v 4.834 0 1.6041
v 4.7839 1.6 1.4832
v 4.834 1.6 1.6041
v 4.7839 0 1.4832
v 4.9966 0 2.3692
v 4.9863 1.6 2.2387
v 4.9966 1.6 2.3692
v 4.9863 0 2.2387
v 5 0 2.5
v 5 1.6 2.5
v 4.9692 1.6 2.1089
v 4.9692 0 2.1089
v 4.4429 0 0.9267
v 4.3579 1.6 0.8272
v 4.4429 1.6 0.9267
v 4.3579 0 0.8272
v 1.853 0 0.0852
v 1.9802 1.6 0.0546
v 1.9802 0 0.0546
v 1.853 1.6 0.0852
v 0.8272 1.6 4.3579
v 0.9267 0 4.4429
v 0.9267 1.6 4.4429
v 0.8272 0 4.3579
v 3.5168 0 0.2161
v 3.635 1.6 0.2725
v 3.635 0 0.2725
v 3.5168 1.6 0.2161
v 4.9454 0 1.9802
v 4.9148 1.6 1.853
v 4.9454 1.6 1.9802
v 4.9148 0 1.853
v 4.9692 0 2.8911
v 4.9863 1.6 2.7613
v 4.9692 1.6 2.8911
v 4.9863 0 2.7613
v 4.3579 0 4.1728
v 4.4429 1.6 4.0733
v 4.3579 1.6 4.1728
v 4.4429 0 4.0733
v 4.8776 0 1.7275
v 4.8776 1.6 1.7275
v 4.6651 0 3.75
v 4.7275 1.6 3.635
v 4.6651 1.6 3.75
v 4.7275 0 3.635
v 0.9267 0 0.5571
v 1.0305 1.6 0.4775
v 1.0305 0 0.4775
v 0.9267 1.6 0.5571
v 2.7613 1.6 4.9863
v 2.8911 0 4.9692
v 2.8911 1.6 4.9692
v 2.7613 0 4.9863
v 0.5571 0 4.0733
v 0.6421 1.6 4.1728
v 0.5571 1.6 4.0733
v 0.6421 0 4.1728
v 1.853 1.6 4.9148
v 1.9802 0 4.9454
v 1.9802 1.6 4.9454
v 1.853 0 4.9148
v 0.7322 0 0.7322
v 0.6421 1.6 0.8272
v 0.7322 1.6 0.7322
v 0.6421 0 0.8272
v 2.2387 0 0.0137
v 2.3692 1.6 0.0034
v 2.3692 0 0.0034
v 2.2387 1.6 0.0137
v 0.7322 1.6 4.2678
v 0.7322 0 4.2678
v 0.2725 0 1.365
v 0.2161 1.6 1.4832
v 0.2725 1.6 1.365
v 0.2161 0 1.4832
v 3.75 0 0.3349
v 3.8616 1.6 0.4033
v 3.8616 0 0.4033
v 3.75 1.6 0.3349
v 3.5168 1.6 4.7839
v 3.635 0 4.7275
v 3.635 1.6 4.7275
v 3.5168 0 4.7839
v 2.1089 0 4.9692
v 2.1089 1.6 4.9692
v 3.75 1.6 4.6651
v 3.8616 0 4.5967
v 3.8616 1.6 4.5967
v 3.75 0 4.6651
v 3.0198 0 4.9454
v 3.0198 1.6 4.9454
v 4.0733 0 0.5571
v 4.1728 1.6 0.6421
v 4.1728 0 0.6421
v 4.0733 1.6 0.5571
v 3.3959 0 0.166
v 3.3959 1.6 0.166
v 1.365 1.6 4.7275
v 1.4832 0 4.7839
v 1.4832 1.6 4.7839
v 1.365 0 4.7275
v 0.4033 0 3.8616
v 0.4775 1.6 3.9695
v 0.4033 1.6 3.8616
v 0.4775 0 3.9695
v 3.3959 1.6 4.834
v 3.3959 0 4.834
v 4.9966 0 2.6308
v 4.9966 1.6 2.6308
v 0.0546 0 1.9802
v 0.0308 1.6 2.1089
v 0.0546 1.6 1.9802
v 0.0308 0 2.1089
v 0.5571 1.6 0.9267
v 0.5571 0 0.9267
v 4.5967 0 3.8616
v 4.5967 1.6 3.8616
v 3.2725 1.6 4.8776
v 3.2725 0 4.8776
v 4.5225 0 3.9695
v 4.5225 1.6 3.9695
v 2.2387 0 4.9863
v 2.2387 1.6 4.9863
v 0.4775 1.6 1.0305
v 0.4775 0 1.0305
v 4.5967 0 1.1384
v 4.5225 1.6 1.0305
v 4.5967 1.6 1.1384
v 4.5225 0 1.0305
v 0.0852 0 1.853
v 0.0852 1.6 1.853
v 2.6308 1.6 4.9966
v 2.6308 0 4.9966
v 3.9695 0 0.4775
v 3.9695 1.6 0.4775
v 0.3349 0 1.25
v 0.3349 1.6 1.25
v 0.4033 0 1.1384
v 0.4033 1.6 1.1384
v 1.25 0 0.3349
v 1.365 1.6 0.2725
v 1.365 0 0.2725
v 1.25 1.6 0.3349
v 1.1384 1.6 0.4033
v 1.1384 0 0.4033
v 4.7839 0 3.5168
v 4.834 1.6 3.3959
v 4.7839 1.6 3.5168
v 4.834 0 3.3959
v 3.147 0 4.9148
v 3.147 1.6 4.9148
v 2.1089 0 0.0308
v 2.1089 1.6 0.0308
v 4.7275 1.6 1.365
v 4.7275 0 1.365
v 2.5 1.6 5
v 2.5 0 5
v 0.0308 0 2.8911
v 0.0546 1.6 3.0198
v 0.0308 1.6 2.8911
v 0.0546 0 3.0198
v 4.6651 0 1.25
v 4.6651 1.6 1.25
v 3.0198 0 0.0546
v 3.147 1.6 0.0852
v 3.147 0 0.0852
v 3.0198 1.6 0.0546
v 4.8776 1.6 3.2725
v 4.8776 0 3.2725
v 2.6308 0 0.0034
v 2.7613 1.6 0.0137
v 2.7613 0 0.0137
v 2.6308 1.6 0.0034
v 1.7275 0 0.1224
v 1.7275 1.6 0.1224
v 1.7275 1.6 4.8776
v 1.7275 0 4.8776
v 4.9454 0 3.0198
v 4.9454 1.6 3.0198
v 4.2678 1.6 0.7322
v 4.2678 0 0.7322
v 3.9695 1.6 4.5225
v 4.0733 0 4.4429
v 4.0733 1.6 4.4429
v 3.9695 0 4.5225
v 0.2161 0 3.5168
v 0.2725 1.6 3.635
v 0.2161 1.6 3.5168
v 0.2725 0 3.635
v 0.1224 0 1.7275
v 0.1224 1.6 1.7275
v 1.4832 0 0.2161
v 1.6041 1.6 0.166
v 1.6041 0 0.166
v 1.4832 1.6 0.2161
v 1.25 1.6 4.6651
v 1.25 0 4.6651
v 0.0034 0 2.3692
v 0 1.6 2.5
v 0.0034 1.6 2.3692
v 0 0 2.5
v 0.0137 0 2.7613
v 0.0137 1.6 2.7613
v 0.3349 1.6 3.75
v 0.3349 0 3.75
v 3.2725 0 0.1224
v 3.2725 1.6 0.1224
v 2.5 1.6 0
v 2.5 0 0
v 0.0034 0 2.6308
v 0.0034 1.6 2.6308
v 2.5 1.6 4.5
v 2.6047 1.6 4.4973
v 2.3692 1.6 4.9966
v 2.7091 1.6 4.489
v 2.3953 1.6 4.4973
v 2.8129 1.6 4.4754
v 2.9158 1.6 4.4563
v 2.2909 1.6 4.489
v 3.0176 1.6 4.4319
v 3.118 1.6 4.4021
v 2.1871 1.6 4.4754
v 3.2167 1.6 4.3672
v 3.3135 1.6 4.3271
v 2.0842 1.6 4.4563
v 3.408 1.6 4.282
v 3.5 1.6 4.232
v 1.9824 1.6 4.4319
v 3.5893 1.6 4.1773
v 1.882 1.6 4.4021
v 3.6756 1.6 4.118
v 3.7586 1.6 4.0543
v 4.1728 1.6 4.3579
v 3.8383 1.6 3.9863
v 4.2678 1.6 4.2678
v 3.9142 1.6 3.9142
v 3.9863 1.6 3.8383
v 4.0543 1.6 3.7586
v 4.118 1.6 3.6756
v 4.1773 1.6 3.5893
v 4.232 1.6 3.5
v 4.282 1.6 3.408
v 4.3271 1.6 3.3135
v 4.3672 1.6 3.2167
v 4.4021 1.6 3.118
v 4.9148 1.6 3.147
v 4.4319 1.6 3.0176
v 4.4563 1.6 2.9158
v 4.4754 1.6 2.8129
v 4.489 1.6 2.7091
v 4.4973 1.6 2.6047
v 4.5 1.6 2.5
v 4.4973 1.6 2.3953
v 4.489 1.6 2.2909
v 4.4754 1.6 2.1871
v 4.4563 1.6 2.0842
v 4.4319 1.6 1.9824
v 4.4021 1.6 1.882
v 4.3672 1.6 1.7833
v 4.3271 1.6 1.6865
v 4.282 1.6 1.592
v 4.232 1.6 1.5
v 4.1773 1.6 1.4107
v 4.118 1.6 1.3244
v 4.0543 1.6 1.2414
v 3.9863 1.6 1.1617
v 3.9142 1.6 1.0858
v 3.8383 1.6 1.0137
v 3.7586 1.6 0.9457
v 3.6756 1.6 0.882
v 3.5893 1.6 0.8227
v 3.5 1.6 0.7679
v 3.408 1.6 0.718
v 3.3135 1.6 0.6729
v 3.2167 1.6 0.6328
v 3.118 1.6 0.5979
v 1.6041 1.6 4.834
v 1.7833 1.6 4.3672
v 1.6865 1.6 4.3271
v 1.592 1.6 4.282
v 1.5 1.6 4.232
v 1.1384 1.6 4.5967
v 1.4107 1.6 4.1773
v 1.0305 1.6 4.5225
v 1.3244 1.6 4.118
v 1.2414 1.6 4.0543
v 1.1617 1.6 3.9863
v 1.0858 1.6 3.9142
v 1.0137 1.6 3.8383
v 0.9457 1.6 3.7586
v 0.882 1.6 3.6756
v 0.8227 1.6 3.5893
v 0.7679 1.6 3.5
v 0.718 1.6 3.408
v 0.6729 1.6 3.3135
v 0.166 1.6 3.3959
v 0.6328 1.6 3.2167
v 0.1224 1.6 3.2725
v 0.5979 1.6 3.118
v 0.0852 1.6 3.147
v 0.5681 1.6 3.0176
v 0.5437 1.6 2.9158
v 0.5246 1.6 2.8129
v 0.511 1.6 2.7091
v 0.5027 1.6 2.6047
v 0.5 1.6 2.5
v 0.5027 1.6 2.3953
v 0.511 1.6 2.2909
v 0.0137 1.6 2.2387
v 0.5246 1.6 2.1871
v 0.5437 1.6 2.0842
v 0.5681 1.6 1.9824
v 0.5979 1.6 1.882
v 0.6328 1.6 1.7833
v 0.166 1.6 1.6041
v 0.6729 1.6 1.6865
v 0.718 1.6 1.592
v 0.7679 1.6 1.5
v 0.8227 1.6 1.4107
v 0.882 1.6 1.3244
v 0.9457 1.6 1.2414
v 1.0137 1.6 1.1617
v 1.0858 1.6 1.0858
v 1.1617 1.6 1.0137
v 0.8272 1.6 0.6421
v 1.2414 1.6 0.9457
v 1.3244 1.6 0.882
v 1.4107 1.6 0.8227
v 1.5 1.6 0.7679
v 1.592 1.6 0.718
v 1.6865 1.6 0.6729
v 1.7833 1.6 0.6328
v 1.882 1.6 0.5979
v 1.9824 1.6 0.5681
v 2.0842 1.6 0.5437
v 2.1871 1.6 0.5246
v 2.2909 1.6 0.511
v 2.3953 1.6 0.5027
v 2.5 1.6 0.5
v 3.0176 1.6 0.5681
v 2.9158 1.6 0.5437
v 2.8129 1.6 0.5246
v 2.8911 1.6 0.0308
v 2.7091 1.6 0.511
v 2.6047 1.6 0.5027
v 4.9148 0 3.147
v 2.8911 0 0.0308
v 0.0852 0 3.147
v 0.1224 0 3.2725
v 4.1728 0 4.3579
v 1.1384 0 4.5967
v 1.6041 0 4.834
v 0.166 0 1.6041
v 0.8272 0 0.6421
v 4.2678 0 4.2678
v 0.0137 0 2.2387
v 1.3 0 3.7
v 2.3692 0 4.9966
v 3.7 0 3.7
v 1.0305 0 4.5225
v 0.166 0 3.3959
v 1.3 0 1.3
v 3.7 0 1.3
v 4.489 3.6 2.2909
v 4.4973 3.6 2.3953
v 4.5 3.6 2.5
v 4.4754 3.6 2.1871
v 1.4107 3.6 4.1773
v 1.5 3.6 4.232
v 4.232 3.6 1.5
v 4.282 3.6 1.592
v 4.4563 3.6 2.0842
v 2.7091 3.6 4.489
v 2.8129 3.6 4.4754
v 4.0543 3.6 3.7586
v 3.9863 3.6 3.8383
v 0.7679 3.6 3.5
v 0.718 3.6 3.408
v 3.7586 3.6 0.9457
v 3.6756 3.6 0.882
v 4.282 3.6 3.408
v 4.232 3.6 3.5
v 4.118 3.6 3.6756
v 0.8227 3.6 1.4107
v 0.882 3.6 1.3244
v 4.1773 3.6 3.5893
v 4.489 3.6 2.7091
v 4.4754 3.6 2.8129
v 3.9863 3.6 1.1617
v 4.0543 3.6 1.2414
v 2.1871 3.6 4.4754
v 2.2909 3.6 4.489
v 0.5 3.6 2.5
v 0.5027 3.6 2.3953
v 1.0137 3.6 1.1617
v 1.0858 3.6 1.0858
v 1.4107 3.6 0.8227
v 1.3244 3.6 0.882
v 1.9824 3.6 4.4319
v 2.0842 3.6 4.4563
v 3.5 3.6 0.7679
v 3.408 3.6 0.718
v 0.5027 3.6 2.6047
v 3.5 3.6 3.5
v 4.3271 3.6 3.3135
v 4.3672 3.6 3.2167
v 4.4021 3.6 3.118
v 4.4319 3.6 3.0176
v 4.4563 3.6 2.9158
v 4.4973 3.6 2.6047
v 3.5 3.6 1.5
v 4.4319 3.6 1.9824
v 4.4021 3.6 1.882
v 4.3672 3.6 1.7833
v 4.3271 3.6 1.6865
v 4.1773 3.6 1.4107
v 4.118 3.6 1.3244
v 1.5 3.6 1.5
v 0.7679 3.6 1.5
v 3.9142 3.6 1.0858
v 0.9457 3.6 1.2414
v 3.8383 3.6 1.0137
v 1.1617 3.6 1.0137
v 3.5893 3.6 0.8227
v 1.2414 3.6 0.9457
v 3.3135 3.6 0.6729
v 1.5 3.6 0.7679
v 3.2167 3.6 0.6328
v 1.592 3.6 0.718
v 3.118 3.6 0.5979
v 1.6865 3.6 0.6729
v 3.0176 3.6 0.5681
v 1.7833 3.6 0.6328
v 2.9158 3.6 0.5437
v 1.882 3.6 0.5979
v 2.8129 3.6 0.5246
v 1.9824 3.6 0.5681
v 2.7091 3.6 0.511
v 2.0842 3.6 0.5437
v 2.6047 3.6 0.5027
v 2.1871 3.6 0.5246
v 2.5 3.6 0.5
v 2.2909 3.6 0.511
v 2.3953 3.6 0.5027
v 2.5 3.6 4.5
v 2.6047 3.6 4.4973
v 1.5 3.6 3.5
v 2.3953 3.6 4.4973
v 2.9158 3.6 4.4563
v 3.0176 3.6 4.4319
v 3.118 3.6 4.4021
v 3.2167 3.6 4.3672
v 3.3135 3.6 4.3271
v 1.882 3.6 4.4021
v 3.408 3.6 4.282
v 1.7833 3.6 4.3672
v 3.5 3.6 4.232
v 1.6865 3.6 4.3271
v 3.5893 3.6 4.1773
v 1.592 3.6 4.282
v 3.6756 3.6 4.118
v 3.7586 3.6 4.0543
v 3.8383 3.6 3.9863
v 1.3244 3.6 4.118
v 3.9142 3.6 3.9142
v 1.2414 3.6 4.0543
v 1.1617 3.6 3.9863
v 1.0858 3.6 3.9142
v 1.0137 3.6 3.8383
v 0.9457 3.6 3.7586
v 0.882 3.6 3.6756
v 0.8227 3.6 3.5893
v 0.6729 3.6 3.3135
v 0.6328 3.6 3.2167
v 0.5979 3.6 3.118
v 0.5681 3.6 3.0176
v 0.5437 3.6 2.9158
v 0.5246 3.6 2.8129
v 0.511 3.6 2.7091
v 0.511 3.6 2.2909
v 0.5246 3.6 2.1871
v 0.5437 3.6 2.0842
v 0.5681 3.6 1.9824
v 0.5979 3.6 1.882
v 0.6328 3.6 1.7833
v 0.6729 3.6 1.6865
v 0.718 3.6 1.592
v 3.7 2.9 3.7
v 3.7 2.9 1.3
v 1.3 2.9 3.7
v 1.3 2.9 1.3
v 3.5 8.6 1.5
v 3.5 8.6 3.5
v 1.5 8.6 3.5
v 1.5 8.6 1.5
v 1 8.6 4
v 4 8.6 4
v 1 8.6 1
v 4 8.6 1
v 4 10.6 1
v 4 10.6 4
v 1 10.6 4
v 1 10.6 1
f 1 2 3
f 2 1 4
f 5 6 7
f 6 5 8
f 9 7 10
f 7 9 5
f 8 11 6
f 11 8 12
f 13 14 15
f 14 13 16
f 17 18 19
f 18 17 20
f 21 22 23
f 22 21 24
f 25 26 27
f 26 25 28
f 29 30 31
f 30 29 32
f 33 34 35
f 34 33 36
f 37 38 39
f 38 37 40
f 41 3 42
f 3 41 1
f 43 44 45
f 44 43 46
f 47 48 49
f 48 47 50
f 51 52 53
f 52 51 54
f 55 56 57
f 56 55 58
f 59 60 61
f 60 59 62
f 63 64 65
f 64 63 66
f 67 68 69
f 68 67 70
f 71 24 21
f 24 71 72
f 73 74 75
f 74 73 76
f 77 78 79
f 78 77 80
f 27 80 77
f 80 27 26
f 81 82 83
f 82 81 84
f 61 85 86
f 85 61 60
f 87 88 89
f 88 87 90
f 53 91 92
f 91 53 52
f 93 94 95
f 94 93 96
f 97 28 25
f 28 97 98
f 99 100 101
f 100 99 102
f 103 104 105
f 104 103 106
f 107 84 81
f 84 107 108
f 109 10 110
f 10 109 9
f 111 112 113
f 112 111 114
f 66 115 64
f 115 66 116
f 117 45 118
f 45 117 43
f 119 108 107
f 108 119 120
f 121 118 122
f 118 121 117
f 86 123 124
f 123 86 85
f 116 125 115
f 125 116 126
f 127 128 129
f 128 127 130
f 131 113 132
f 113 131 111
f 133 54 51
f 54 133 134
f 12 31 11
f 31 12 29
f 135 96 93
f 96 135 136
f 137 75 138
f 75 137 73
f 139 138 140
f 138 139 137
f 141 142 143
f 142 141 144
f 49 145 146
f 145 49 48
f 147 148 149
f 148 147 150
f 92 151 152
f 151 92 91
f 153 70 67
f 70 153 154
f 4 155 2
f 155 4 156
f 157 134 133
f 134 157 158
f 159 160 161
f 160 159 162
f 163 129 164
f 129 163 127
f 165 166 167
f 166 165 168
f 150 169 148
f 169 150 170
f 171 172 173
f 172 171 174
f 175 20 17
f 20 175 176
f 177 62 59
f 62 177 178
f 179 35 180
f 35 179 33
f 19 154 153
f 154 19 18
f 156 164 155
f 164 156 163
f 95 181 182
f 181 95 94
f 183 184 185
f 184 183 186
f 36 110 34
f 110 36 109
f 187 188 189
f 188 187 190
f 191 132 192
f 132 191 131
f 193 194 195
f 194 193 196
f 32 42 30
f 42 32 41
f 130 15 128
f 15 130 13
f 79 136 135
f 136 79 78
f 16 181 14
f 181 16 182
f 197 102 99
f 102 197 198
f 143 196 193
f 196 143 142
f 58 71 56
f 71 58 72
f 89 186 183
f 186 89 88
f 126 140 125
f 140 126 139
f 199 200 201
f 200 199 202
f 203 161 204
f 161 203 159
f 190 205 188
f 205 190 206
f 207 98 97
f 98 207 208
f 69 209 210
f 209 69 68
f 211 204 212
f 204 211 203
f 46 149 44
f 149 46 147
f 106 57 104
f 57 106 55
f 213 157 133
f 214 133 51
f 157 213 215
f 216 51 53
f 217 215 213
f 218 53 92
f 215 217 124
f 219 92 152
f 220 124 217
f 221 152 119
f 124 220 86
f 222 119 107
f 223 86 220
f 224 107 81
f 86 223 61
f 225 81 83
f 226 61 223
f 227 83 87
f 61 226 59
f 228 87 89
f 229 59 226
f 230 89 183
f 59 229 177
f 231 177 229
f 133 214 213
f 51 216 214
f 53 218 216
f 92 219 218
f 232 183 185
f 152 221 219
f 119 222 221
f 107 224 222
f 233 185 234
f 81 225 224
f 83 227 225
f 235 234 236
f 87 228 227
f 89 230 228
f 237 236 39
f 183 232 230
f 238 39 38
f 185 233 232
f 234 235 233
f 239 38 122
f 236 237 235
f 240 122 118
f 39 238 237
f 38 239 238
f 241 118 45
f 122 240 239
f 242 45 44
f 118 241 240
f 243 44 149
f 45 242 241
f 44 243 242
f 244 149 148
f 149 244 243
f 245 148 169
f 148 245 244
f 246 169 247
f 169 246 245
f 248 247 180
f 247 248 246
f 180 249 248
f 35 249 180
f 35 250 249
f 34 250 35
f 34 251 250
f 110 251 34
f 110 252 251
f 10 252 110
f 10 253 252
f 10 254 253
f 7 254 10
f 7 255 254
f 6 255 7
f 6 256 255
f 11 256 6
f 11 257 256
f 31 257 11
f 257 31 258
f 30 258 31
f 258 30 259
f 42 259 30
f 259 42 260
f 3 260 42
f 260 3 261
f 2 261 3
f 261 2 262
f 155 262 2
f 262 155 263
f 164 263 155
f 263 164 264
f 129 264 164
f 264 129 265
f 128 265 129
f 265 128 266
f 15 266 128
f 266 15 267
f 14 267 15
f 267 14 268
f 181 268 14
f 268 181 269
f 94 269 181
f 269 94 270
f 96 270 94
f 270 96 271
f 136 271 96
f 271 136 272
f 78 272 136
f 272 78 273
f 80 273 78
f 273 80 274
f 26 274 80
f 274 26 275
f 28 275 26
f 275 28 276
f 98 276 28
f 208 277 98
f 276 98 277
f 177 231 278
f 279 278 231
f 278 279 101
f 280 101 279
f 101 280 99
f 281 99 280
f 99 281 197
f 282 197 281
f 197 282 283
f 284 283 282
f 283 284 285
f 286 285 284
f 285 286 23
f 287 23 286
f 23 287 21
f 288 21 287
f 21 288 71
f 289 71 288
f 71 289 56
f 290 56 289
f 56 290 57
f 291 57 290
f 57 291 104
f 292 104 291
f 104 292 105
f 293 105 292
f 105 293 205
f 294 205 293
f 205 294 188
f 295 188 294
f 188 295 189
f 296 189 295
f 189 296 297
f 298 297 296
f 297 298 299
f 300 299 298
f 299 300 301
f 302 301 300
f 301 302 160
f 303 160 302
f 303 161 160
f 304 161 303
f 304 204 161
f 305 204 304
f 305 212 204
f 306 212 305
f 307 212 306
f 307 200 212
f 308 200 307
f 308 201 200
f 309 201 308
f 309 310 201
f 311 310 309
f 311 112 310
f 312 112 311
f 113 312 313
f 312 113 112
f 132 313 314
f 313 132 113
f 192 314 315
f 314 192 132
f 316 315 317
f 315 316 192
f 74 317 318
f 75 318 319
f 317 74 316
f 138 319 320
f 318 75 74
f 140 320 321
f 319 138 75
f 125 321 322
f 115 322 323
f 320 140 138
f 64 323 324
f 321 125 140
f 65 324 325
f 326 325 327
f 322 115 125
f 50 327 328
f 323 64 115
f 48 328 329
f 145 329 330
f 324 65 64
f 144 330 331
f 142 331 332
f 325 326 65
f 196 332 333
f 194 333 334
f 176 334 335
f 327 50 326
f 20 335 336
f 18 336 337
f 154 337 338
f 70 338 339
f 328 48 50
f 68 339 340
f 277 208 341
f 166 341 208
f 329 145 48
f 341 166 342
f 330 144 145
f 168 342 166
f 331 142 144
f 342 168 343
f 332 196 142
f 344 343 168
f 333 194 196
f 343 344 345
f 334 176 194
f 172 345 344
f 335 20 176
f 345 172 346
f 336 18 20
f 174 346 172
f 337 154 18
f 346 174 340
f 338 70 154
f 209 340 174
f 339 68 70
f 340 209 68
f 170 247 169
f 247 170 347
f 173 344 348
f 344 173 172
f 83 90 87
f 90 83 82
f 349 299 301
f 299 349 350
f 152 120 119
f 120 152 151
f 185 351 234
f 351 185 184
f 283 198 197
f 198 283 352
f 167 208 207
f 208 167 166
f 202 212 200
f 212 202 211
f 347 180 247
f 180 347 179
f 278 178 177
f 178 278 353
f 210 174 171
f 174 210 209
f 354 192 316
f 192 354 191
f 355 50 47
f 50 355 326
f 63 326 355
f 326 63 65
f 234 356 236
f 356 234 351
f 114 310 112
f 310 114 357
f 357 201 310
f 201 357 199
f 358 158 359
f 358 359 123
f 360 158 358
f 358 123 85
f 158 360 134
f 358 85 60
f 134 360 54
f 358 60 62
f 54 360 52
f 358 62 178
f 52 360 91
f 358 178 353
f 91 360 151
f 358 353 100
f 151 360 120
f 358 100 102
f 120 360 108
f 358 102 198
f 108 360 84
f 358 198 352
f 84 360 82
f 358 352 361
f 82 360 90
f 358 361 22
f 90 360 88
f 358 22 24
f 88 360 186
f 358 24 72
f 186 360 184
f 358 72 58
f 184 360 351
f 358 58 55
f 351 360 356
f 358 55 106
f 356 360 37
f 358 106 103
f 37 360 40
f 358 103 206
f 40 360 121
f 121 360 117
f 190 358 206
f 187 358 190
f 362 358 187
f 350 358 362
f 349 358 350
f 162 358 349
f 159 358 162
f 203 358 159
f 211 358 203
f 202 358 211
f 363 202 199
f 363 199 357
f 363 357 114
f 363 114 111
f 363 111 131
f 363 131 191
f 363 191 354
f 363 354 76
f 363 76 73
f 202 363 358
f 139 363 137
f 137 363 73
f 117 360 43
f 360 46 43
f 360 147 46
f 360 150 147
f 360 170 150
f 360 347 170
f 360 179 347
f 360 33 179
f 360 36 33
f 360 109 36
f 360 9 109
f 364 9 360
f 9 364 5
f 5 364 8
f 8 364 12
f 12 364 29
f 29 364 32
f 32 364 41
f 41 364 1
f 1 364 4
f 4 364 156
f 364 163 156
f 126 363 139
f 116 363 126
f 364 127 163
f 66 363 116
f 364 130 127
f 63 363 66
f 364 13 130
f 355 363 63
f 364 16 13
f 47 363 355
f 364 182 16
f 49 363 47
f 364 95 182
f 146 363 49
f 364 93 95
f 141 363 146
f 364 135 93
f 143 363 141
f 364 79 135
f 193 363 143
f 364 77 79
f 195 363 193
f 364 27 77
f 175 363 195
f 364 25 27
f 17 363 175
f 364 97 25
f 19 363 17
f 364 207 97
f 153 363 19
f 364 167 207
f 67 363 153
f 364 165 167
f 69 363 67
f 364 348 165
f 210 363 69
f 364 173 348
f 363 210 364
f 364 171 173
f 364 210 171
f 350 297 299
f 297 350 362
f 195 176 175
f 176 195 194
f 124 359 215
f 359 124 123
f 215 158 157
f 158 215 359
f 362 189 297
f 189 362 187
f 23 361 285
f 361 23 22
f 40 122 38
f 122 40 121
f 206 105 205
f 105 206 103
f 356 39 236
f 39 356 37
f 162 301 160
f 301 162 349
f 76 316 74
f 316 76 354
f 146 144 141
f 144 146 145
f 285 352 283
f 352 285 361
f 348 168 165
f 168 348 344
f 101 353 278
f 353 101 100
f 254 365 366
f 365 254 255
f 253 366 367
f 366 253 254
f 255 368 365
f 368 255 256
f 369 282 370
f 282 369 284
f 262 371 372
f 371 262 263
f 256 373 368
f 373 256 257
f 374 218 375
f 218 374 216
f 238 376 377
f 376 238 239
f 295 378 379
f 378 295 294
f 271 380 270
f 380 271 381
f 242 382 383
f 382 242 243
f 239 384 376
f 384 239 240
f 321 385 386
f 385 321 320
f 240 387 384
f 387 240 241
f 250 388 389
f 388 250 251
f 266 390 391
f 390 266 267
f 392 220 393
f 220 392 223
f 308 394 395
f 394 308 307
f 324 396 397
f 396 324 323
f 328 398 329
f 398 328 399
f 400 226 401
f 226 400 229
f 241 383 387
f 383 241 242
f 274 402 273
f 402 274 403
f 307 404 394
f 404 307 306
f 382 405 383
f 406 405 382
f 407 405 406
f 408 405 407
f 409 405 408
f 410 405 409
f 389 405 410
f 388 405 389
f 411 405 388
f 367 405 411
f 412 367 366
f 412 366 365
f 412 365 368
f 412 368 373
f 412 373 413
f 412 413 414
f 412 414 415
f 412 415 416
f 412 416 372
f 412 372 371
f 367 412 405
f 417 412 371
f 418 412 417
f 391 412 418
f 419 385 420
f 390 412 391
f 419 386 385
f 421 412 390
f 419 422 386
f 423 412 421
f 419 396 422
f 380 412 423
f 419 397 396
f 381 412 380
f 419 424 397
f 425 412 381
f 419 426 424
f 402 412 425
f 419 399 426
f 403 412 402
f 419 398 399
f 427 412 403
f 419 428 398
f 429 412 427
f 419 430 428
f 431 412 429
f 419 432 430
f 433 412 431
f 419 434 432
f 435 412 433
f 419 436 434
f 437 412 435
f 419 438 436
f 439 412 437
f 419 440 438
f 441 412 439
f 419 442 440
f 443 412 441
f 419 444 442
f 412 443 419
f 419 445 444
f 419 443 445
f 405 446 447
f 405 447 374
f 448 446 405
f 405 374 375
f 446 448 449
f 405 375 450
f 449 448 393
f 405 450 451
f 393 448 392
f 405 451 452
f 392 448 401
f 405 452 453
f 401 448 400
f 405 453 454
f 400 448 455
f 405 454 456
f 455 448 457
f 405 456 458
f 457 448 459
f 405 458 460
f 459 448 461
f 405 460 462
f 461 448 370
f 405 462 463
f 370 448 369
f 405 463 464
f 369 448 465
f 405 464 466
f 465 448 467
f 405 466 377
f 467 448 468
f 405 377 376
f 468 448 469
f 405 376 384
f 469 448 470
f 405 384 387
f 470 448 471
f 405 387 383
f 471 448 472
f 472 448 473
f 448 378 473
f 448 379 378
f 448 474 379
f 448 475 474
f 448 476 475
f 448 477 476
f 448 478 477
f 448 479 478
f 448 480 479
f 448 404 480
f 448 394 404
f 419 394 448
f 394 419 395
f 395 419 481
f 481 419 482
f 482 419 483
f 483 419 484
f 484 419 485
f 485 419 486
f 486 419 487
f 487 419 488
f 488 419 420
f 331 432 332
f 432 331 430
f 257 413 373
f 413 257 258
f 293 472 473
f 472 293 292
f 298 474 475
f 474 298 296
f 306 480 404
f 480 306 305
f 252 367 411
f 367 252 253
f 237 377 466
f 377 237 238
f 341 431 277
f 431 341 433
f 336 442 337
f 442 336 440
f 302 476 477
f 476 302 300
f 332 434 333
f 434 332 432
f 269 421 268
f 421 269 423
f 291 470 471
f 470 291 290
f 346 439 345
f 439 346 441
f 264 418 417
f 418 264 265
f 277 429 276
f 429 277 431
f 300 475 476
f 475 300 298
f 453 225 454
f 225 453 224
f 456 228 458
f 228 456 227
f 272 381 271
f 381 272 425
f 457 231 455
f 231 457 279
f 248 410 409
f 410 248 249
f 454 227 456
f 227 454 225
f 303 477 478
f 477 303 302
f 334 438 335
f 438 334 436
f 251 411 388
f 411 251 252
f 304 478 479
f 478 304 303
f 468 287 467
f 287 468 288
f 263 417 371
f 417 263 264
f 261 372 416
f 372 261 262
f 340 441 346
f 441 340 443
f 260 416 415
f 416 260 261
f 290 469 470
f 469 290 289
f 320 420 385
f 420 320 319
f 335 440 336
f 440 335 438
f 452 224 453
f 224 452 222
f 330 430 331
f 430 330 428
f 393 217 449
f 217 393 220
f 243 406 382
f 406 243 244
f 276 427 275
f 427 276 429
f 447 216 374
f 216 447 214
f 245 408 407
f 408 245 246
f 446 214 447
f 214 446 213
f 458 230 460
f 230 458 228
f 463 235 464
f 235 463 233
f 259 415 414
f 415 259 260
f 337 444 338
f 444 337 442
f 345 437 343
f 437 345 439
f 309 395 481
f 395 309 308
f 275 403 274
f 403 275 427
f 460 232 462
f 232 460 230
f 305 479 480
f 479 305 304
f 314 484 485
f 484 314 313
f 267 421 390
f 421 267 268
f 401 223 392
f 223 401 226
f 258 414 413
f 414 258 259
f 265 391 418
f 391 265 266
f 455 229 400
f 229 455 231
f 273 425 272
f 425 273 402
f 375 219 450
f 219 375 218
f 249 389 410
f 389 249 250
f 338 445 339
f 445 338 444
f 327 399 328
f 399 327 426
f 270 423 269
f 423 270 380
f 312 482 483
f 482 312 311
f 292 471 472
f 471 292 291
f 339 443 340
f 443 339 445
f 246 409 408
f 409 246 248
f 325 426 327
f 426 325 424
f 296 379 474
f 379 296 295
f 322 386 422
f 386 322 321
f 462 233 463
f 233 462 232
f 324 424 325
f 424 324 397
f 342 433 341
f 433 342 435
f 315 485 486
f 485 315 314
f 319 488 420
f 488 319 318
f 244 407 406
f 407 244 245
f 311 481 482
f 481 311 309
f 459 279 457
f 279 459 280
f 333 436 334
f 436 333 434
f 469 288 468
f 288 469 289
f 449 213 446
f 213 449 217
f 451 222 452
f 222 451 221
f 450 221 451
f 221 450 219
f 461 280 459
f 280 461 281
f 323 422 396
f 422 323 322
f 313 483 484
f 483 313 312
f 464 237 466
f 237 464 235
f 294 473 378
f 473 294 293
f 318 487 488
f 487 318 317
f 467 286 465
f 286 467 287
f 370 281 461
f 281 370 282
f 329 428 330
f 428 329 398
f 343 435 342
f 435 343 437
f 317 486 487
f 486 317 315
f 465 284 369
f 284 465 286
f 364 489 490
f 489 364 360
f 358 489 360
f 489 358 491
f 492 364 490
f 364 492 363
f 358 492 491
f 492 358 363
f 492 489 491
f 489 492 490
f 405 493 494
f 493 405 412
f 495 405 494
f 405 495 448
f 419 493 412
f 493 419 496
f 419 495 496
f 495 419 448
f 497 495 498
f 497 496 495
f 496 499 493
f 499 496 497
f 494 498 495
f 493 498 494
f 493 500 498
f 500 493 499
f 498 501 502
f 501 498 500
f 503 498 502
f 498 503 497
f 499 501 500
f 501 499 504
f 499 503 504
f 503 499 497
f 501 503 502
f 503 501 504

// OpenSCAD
// file: shared/measurements.scad
/*
 * Keyboard Measurements
 */

pcb_thickness = 1.6;

// The plastic used to cover the TP mount's metal part to make
// sure it doesn't short the switch pins.
tp_isolator_thickness = 0.4;




/*
 * Kailh Choc Switch Measurements
 * http://www.kailh.com/uploads/allimg/171208/2-1G20Q0432C29.png
 */

// The width of the choc switch where it touches the bottom plate
choc_width_bottom = 13.6;

// The width of the choc switch with the notch that sits above the top plate
choc_width_notch = 15.0;

// How much the notch adds in width on each side
// (0.7mm)
choc_notch_width = (choc_width_notch - choc_width_bottom) / 2;

// The space from the pcb until the choc switch notch
choc_notch_to_pcb_z_space = 2.2;

// Total x distance between switch center points (choc x spacing)
choc_spacing_x = 18;

// The space between two switches at the bottom plate
// (4.4mm)
choc_switches_space_between_bottom = choc_spacing_x - choc_width_bottom;

// The space between two switches at the top with the little notch
// (3mm)
choc_switches_space_between_top = choc_spacing_x - choc_width_notch;
// file: trackpoint_extension.scad
include <shared/measurements.scad>

// Overlap Buffer for cutting
ovb = 0.01;

module draw_trackpoint_extension(
        // The height from the pcb to where you want the cap to end
        desired_cap_height,

        // How far below the pcb the TP is mounted (from start of the stem)
        tp_mounting_distance,

        // The measured width and height of the TP stem
        tp_stem_width,
        tp_stem_height,

        // The red cap dimensions
        tp_cap_height_total,
        tp_cap_hole_height,
        tp_cap_hole_width,

        // By how much you want to increase the adapter hole compared to the
        // actual TP stem width
        adapter_hole_incr=0.2,

        // The width of the adapter around the TP stem
        adapter_width_below_pcb=5.0,
        adapter_width_above_pcb=4.0,

        // By how much you want to increase the tip for a tighter cap fit
        tip_width_incr=0,

        // The thickness of the PCB
        pcb_height=1.6) {

    adapter_radius_below_pcb = adapter_width_below_pcb / 2;
    adapter_radius_above_pcb = adapter_width_above_pcb / 2;
    adapter_height = (
        tp_mounting_distance + pcb_height + choc_notch_to_pcb_z_space - 0.2
    );

    adapter_hole_width = tp_stem_width + adapter_hole_incr;
    adapter_hole_height = tp_stem_height + adapter_hole_incr;
    adapter_hole_offset = adapter_radius_below_pcb - adapter_hole_width / 2;

    adapter_hole_corner_distance = (
        sqrt(
            adapter_hole_width * adapter_hole_width +
            adapter_hole_width * adapter_hole_width
        ) / 2
    );
    adapter_wall_thickness_below_pcb = (
        adapter_radius_below_pcb - adapter_hole_corner_distance
    );
    adapter_wall_thickness_above_pcb = (
        adapter_radius_above_pcb - adapter_hole_corner_distance
    );
    adapter_wall_thickness_top = adapter_height - adapter_hole_height;

    // Since a portion of the extension adapter will be below the top of the
    // pcb, we calculate the length that it will extend above the pcb here
    adapter_height_below_pcb = pcb_height + tp_mounting_distance;
    adapter_height_above_pcb = adapter_height - adapter_height_below_pcb;

    tip_width = tp_cap_hole_width + tip_width_incr;
    tip_height = tp_cap_hole_height;
    tip_offset = adapter_radius_below_pcb - tip_width / 2;

    // The height added on top of the stem extension. Needed for the total TP
    // extension height
    tp_cap_top_height = tp_cap_height_total - tp_cap_hole_height;

    // Height of the part between the mount at the bottom and tip at the top
    extension_height = (
        desired_cap_height - tp_cap_top_height - tip_height
        - adapter_height_above_pcb
    );

    extension_width = 2;
    extension_offset = adapter_radius_below_pcb - extension_width / 2;

    total_height = adapter_height + extension_height + tip_height;
    above_pcb_height = total_height - adapter_height_below_pcb;
    above_pcb_height_cap = above_pcb_height + tp_cap_top_height;

    center = [false, false, false];

    echo(str("Building TP extension..."));
    echo(str("\t Total height: ", total_height, "mm"));
    echo(str("\t Below PCB height: ", adapter_height_below_pcb, "mm"));
    echo(str("\t Above PCB height: ", above_pcb_height, "mm"));
    echo(str("\t Above PCB height with cap: ", above_pcb_height_cap, "mm"));
    echo(str("\t Adapter height: ", adapter_height, "mm"));
    echo(str("\t Adapter width below pcb: ", adapter_width_below_pcb, "mm"));
    echo(str("\t Adapter width above pcb: ", adapter_width_above_pcb, "mm"));
    echo(str("\t Adapter hole height: ", adapter_hole_height, "mm (+", adapter_hole_height - tp_stem_height, "mm)"));
    echo(str("\t Adapter hole width: ", adapter_hole_width, "mm (+", adapter_hole_width - tp_stem_width, "mm)"));
    echo(str("\t Adapter wall thickness below pcb: ", adapter_wall_thickness_below_pcb, "mm"));
    echo(str("\t Adapter wall thickness above pcb: ", adapter_wall_thickness_above_pcb, "mm"));
    echo(str("\t Adapter wall thickness top: ", adapter_wall_thickness_top, "mm"));

    difference() {

        union() {
            // Adapter below pcb
            translate([adapter_radius_below_pcb, 0, adapter_radius_below_pcb])
            rotate([-90, 0, 0])
                cylinder(
                    $fn=120,
                    h=adapter_height_below_pcb,
                    r=adapter_radius_below_pcb
                );

            // Adapter above pcb
            translate([
                adapter_radius_below_pcb,
                adapter_height_below_pcb,
                adapter_radius_below_pcb
            ])
            rotate([-90, 0, 0])
                cylinder(
                    $fn=120,
                    h=adapter_height_above_pcb,
                    r=adapter_radius_above_pcb
                );
        }

        // Hole
        translate([adapter_hole_offset, -ovb, adapter_hole_offset])
            cube([
                adapter_hole_width,
                adapter_hole_height + ovb,
                adapter_hole_width
            ]);
    };

    // Top extension
    translate([+extension_offset, +adapter_height, +extension_offset])
        cube(
            [extension_width, extension_height, extension_width]
        );

    // Tip for red cap
    translate([+tip_offset, +adapter_height + extension_height, +tip_offset])
        cube([tip_width, tip_height, tip_width]);
}
// file: export_tp_red_t460s.scad
use <trackpoint_extension.scad>

/*
 * Parameters
 */

// The height above the pcb where you want the top of the red cap to be
desired_cap_height_default = 10.5;

// Thickness of the pcb
pcb_height_default = 1.6;

// How far the TP is mounted BELOW the PCB.
// This should include the thickness of any plastic or electrical tape you use
// to isolate the TP mount.
tp_mounting_distance_default = 0;

// By how much you want to increase the adapter hole compared to the
// actual TP stem width
adapter_hole_incr_default = 0.2;

// How wide the adapter should be below and above the pcb.
// Pay attention to the adapter wall thickness calculations in the logs to
// ensure it is thick enough to withstand the pressure of the TP.
//
// You also need to consider the size of your TP hole, as well as how much your
// switches are going to portrude into the hole.
adapter_width_below_pcb_default = 5;
adapter_width_above_pcb_default = 4;

// By how much you want to increase the tip for a tighter cap fit
tip_width_incr_default = 0;


/*
 * TP Measurements
 */

// From bottom metal part to stem top
tp_total_height = 4.0;

// The metal and black bottom part.
// This is the height that sticks out below the pcb if the
// TP is mounted totally flush.
tp_board_thickness = 1.3;

// The height of the white stem
// (2.7mm)
tp_stem_height = tp_total_height - tp_board_thickness;

// TP white stem dimensions
tp_stem_width = 2.2;
tp_stem_diameter = 3.0;

// TP dot dimensions
tp_cap_height_total = 4.0;
tp_cap_hole_height = 3.0;

// Since the tip is rubber, we can make it a little thicker than the original
// stem for better fit
tp_cap_hole_width = 2.5;


module draw_tp_ext_red_t460s(
        desired_cap_height=desired_cap_height_default,
        tp_mounting_distance=tp_mounting_distance_default,
        adapter_hole_incr=adapter_hole_incr_default,
        adapter_width_below_pcb=adapter_width_below_pcb_default,
        adapter_width_above_pcb=adapter_width_above_pcb_default,
        tip_width_incr=tip_width_incr_default,
        pcb_height=pcb_height_default) {

    draw_trackpoint_extension(
        desired_cap_height=desired_cap_height,

        // How far below the pcb the TP is mounted (from start of the stem)
        tp_mounting_distance=tp_mounting_distance,

        // The measured width and height of the TP stem
        tp_stem_width=tp_stem_width,
        tp_stem_height=tp_stem_height,

        // The red cap dimensions
        tp_cap_height_total=tp_cap_height_total,
        tp_cap_hole_height=tp_cap_hole_height,
        tp_cap_hole_width=tp_cap_hole_width,

        // By how much you want to increase the adapter hole compared to the
        // actual TP stem width
        adapter_hole_incr=adapter_hole_incr,

        // The width of the adapter around the TP stem
        adapter_width_below_pcb=adapter_width_below_pcb,
        adapter_width_above_pcb=adapter_width_above_pcb,

        // By how much you want to increase the tip for a tighter cap fit
        tip_width_incr=tip_width_incr,

        // The thickness of the PCB
        pcb_height=pcb_height
    );
}

// Allow inclusion of this file without running if do_not_run is set to true
// before the inclusion
if(is_undef(do_not_run) || do_not_run == false) {
    draw_tp_ext_red_t460s();
}
// main file
do_not_run = true;
include <export_tp_red_t460s.scad>

// TP Dot from a Dell laptop I have
tp_cap_height_total = 3.5;
tp_cap_hole_height = 2.0;
tp_cap_hole_width = 3;

draw_tp_ext_red_t460s();
